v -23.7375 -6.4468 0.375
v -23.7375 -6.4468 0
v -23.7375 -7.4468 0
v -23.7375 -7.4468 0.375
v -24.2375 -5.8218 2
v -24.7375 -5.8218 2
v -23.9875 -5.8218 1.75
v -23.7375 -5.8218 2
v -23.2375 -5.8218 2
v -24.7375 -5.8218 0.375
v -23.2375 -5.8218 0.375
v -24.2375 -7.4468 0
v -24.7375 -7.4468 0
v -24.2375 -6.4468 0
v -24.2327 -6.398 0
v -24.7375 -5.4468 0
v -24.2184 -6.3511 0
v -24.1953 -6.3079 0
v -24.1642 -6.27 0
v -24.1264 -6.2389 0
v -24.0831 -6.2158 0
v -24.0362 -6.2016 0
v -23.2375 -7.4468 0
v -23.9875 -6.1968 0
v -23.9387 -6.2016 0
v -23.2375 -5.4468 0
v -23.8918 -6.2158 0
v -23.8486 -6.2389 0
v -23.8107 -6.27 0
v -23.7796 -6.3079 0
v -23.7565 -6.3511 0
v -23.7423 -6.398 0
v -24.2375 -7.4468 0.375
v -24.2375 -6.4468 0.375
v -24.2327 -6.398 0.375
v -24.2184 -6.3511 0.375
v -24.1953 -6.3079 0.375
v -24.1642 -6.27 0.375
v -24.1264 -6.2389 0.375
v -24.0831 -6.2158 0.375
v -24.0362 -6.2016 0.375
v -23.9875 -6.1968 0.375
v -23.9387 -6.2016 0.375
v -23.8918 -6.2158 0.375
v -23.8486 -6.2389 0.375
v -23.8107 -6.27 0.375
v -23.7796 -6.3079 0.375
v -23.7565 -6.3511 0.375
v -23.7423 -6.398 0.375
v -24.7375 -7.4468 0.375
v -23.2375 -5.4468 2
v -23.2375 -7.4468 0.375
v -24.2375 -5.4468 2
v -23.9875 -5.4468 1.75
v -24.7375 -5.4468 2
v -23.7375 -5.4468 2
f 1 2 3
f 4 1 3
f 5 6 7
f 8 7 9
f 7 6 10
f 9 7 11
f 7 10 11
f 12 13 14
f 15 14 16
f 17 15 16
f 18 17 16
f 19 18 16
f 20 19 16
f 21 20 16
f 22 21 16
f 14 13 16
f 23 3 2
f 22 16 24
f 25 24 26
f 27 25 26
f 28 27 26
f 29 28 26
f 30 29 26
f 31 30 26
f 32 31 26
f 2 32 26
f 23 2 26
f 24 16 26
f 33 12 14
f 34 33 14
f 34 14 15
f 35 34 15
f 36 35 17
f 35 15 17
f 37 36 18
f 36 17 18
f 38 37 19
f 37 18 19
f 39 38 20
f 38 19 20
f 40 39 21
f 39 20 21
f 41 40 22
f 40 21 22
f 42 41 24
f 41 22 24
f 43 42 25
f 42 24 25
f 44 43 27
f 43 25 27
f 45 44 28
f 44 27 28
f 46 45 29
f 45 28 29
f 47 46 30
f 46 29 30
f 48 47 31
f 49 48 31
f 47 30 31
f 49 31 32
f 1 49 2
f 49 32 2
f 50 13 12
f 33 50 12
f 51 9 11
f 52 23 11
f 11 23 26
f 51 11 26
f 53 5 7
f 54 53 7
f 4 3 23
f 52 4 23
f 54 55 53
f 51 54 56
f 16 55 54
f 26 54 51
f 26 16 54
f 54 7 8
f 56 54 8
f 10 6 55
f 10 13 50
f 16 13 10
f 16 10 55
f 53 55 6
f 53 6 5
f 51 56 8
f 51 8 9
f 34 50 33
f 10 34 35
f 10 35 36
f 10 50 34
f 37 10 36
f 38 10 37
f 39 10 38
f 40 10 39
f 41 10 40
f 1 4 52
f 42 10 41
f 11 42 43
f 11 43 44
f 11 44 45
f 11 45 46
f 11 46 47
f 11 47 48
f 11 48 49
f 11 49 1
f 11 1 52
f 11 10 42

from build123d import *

# Parameters (mm, degrees)
F1_DEPTH = 0.375
F2_W     = 1.5
F2_H     = 0.375
F3_DEPTH = 1.625
F5_DEPTH = 0.375


with BuildPart() as f1:
    # F0 (on Top) → F1 (new body)
    with BuildSketch(Plane.XY):
        with BuildLine():
            Line((-23.237459, -5.446789), (-24.737459, -5.446789))
            Line((-24.737459, -5.446789), (-24.737459, -7.446789))
            Line((-24.737459, -7.446789), (-24.237459, -7.446789))
            Line((-24.237459, -7.446789), (-24.237459, -6.446789))
            ThreePointArc((-24.237459, -6.446789), (-23.987459, -6.196789), (-23.737459, -6.446789))
            Line((-23.737459, -6.446789), (-23.737459, -7.446789))
            Line((-23.737459, -7.446789), (-23.237459, -7.446789))
            Line((-23.237459, -7.446789), (-23.237459, -5.446789))
        make_face()
    extrude(amount=F1_DEPTH)

    # F2 (on face) → F3 (join)
    with BuildSketch(Plane.XY.offset(0.375)):
        with Locations((-23.987459, -5.634289)):
            Rectangle(F2_W, F2_H)
    extrude(amount=F3_DEPTH)

    # F4 (on face) → F5 (cut, through all)
    with BuildSketch(Plane.XZ.offset(5.821789)):
        Polygon((-23.737459, 2), (-24.237459, 2), (-23.987459, 1.75), align=None)
    extrude(amount=-F5_DEPTH, mode=Mode.SUBTRACT)


solid = f1.part
